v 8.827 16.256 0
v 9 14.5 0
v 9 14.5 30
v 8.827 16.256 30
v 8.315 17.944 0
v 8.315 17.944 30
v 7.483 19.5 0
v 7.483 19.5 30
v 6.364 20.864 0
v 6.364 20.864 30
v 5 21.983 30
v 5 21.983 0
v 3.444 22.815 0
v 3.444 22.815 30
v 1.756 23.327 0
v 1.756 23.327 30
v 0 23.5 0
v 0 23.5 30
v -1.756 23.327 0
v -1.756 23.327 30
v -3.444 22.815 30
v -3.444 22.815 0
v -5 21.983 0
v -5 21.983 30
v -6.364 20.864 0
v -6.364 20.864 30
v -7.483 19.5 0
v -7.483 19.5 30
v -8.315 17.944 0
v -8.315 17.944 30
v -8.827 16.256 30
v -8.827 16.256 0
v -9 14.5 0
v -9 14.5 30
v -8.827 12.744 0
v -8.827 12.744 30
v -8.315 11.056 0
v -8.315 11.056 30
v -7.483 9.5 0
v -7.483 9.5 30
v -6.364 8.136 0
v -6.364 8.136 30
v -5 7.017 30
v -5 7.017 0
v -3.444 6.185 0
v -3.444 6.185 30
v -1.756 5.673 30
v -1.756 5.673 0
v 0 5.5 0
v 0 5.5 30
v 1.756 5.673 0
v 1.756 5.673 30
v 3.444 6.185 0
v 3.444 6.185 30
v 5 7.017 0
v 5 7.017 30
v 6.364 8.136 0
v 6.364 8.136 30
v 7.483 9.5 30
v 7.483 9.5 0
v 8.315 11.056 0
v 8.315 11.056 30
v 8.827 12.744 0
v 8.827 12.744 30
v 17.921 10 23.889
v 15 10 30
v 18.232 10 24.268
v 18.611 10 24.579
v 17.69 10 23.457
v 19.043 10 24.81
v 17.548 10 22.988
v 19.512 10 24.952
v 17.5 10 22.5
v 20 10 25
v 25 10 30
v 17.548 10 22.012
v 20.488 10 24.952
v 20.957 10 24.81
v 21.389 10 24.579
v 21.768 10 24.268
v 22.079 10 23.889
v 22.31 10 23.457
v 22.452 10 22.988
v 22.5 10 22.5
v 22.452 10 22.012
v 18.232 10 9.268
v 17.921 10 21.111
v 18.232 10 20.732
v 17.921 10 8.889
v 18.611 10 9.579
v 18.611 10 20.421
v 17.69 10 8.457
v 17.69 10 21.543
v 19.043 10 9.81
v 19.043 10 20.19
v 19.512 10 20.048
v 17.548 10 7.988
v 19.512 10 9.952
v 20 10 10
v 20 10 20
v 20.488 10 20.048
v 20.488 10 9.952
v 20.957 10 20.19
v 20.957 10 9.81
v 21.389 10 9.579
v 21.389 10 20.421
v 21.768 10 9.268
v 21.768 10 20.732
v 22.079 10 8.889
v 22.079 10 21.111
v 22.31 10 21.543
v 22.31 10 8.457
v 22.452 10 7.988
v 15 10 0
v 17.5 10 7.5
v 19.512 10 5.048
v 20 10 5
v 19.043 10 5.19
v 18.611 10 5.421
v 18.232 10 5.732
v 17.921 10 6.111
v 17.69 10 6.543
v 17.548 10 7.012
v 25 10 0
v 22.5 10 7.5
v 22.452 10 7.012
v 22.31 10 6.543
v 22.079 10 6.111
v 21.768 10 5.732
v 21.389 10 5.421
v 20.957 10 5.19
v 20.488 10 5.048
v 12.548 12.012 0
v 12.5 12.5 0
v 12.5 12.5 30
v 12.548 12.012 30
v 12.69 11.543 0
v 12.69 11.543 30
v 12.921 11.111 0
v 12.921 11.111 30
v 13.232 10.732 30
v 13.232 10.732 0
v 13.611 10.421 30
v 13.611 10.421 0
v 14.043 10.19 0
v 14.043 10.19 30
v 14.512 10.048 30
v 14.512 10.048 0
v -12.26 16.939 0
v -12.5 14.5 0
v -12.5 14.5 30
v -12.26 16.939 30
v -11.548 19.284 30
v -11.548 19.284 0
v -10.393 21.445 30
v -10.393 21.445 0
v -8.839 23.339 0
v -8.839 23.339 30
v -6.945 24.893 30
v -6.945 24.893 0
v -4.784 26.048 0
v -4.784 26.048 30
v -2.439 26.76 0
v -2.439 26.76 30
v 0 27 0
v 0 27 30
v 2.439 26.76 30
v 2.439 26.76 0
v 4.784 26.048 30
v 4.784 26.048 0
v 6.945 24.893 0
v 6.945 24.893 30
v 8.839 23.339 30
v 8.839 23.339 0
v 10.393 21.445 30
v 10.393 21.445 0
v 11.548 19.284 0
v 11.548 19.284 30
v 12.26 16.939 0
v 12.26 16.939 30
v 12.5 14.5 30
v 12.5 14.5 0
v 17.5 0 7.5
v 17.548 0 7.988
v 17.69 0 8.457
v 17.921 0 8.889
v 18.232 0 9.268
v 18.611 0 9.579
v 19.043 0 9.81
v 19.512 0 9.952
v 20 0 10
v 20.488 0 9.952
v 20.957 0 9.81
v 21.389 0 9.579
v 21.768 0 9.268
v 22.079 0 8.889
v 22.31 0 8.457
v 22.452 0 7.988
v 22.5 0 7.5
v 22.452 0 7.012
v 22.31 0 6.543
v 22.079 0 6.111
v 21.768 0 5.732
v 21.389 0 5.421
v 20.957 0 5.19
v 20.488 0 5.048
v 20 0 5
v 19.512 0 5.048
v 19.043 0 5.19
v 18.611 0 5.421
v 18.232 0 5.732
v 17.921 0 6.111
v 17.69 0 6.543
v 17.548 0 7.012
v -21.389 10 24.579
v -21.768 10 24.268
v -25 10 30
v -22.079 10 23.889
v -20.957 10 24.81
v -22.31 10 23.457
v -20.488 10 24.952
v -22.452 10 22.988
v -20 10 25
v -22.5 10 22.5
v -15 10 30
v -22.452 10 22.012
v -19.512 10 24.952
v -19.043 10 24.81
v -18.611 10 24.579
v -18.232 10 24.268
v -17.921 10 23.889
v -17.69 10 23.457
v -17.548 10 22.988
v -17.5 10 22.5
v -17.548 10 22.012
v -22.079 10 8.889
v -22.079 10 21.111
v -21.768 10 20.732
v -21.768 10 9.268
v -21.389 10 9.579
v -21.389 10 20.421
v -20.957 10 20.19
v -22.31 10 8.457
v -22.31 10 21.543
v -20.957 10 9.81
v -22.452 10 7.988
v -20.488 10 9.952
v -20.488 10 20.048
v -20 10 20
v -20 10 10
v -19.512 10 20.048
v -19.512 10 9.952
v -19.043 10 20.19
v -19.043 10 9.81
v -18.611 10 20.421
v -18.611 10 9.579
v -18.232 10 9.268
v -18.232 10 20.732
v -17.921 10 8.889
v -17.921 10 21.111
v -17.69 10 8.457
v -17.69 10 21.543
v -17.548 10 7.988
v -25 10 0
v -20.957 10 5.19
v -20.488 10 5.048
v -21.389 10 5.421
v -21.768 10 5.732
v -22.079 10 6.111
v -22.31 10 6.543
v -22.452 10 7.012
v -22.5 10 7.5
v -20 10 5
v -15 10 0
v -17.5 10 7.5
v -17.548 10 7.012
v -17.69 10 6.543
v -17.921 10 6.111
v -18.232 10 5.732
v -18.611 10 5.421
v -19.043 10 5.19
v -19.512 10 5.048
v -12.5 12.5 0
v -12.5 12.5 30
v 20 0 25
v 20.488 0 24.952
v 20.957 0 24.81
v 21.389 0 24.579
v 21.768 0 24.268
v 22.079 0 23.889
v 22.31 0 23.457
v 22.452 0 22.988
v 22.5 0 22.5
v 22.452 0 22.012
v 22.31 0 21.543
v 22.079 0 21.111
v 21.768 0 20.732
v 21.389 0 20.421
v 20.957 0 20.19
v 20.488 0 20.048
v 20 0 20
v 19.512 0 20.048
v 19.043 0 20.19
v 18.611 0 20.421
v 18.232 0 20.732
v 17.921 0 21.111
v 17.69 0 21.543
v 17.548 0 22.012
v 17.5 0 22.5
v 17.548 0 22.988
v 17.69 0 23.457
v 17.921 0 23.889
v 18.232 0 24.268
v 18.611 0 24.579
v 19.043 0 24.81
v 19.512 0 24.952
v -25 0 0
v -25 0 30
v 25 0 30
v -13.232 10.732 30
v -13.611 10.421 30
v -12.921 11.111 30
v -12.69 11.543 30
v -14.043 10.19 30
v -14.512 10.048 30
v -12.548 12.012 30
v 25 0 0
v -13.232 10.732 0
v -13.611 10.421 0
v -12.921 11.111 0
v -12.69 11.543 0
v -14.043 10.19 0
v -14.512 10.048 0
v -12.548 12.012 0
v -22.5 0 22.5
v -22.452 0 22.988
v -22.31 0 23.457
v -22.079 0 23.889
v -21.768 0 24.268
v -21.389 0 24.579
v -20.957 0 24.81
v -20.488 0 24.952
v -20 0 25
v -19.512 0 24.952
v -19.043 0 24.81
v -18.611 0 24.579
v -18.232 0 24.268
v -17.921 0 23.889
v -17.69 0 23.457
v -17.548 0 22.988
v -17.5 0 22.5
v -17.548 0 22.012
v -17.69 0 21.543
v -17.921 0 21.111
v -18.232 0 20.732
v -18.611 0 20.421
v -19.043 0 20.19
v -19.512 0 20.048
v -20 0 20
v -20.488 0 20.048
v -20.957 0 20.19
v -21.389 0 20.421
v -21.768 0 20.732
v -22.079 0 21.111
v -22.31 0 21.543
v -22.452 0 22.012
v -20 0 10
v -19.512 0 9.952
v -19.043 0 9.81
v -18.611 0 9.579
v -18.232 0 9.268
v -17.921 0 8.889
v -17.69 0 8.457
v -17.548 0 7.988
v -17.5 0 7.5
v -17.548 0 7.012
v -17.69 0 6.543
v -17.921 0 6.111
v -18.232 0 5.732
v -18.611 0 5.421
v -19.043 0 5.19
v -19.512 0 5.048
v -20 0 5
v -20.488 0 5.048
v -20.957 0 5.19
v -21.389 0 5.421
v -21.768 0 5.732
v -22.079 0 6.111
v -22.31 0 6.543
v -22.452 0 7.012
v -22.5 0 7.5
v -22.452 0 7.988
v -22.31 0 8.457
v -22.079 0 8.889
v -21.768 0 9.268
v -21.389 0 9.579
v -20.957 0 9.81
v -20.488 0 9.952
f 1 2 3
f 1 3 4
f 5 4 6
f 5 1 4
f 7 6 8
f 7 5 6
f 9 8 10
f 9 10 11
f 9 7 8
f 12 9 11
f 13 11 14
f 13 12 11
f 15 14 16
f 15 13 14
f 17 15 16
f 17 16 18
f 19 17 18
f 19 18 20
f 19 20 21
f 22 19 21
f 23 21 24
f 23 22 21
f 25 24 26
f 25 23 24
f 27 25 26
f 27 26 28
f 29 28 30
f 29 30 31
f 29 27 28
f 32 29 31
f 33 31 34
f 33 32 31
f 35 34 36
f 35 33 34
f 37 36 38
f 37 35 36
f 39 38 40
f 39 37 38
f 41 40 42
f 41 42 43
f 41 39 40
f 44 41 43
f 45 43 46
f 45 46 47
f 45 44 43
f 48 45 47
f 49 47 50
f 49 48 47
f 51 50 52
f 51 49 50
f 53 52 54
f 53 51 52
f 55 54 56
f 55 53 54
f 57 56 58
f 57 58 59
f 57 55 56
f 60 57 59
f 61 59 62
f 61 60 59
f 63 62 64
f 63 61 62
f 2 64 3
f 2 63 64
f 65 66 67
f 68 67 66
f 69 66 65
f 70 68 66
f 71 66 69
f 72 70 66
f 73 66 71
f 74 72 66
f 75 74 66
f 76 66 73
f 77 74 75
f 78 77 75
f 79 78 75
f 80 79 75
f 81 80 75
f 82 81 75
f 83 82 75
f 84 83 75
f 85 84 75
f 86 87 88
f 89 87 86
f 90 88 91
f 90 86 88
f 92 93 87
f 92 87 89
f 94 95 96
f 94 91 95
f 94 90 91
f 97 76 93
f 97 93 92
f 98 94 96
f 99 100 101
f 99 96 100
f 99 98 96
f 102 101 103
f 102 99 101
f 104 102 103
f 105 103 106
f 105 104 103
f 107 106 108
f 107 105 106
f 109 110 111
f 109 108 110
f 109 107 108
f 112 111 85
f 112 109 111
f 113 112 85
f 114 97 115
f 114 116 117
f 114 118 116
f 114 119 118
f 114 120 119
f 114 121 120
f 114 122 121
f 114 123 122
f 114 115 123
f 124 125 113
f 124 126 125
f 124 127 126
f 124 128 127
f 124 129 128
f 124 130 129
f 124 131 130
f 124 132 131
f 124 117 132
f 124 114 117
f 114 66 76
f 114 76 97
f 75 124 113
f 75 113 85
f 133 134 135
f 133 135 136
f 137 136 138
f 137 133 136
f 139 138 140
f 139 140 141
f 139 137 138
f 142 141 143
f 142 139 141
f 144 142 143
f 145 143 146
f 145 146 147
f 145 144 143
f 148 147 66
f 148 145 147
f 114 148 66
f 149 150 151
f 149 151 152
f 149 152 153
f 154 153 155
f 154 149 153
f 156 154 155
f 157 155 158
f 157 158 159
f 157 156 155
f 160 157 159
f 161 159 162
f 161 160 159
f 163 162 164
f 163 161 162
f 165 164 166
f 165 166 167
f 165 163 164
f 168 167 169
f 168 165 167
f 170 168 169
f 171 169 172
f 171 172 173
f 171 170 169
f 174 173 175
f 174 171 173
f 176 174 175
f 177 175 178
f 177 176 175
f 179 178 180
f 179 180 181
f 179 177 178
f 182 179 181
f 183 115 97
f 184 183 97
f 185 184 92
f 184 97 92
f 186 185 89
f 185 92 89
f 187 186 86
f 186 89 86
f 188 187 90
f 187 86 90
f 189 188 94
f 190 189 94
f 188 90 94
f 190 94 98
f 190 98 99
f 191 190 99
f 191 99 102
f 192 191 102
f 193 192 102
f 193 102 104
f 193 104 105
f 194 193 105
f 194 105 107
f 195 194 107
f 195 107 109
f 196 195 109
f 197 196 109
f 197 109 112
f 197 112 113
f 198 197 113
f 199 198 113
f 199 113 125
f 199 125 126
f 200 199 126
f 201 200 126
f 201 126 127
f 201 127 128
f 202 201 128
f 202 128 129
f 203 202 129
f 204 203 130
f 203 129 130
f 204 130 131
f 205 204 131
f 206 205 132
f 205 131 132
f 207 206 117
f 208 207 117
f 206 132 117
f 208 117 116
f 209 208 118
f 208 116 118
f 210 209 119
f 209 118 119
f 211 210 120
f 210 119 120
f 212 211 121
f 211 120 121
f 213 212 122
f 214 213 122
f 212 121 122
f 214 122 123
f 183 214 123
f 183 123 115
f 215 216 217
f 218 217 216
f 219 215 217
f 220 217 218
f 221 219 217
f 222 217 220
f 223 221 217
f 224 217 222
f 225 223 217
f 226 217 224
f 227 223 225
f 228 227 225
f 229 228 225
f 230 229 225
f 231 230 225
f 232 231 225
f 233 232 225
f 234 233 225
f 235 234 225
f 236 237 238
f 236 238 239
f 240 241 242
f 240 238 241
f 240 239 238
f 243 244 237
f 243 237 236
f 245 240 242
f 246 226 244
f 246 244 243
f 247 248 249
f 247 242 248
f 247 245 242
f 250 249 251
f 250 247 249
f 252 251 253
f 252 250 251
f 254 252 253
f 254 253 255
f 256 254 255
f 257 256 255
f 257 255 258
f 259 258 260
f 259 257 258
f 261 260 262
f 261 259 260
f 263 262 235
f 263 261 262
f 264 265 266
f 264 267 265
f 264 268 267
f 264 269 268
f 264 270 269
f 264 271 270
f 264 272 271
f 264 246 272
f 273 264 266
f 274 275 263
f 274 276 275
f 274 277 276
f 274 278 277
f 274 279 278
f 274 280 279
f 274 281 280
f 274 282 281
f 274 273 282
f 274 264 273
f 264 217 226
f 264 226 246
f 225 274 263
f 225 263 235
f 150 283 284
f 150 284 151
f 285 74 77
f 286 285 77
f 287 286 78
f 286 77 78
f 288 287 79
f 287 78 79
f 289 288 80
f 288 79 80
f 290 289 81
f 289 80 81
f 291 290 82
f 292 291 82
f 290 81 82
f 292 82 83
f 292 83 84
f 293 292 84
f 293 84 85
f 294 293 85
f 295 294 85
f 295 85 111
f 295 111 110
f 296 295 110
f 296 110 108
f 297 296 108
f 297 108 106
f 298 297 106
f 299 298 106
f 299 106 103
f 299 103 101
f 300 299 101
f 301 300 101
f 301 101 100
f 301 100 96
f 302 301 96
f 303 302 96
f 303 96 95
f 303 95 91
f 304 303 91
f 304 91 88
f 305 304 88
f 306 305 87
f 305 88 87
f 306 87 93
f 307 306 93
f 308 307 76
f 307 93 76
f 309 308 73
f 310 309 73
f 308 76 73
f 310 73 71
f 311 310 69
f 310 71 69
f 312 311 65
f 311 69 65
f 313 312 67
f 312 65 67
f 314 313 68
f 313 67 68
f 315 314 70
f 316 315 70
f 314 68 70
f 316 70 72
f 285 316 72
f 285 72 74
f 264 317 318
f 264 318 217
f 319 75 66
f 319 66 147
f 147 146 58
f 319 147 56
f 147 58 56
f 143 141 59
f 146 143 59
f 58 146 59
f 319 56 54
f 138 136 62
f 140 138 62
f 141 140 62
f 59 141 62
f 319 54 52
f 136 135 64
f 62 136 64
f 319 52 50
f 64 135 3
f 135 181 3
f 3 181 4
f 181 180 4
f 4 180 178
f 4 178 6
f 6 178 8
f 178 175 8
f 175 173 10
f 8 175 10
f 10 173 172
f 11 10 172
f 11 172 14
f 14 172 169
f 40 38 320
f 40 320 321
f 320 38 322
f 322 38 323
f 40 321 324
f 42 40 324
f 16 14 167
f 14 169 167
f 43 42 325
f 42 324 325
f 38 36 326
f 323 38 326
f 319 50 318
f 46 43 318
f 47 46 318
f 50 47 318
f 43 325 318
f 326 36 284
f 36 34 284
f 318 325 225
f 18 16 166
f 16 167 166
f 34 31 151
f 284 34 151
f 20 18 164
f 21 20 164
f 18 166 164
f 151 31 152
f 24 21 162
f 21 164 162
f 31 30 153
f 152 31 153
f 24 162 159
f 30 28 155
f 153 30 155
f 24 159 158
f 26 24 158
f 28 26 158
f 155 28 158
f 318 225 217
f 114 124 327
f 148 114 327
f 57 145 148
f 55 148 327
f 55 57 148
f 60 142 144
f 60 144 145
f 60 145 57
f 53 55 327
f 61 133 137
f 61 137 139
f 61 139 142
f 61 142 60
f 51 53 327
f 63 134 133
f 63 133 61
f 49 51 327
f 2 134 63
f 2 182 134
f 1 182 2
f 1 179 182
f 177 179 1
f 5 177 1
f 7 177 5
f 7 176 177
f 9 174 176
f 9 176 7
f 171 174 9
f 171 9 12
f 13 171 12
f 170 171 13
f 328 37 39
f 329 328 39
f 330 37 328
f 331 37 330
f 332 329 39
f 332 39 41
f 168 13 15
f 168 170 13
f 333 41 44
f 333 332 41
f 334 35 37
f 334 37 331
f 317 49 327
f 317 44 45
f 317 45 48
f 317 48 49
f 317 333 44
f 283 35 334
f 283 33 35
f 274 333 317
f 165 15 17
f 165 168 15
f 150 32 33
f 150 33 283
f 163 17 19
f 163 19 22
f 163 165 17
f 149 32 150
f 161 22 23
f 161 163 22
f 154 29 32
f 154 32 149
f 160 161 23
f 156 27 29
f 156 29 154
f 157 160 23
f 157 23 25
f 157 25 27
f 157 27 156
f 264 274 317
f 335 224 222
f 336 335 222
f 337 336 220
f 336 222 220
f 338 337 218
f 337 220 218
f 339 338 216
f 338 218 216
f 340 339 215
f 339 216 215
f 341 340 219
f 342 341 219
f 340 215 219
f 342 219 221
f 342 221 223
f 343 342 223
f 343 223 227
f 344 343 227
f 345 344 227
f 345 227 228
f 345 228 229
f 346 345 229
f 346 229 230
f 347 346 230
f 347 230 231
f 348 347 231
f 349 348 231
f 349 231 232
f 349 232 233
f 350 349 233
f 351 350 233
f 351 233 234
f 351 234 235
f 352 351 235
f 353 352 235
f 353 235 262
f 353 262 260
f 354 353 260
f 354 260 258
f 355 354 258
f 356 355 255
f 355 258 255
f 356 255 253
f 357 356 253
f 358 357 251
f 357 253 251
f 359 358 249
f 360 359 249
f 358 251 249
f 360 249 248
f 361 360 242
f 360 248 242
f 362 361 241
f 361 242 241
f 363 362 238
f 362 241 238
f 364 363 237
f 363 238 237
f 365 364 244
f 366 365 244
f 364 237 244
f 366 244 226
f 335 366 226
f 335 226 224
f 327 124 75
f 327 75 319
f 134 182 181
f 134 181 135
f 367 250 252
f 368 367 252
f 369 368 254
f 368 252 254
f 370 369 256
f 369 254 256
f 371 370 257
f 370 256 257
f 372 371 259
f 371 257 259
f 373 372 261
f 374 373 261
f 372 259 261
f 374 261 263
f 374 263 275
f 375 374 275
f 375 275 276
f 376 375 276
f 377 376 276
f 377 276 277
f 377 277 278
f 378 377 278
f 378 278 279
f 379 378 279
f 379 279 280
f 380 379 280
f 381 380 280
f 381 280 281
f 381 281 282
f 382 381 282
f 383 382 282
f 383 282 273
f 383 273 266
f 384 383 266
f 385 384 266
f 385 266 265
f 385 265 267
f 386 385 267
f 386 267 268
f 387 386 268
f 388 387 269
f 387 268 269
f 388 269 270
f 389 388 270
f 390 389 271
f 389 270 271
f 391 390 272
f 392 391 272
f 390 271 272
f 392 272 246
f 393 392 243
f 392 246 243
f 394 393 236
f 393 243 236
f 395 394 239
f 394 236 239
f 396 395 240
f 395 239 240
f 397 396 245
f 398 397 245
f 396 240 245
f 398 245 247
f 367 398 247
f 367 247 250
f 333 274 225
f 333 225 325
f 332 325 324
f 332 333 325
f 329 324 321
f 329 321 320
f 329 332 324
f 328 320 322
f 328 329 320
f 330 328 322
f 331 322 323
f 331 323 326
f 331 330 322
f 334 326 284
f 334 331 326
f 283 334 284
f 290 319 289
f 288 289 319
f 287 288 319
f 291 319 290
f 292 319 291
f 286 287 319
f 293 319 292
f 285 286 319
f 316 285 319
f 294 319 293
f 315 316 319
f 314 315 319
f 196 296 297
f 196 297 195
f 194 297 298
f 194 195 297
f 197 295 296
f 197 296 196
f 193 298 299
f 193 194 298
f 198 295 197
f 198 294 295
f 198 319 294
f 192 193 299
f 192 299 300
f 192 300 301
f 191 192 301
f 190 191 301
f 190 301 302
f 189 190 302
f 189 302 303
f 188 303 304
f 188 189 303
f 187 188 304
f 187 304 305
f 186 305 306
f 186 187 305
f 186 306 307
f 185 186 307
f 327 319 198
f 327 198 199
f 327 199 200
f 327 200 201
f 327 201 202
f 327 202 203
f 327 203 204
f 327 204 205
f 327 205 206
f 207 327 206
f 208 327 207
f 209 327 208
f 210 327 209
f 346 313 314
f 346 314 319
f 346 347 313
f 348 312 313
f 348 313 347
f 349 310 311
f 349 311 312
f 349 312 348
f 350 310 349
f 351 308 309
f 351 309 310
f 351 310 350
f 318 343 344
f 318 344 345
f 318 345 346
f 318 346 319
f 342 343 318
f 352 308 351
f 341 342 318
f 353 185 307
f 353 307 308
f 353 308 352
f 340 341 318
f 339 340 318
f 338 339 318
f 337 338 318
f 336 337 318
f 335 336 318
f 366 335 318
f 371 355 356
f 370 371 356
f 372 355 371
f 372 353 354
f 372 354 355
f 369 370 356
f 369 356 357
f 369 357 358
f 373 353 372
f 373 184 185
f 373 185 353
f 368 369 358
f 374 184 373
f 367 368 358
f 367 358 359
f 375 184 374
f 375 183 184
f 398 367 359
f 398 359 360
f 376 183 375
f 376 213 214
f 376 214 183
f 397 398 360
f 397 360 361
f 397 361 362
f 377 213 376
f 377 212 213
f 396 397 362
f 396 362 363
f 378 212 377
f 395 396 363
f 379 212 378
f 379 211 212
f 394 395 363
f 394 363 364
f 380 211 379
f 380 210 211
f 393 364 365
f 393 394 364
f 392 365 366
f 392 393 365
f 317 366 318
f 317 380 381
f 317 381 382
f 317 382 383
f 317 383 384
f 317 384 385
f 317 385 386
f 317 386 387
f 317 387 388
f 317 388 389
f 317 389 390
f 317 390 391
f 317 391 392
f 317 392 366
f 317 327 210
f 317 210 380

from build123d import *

# Parameters (mm, degrees)
SKETCH1_R           = 9
BOSS_EXTRUDE1_DEPTH = 30
SKETCH3_R           = 2.5
CUT_EXTRUDE1_DEPTH  = 17.65


with BuildPart() as part:
    # Sketch1 → Boss-Extrude1 (new body)
    with BuildSketch(Plane.XY):
        with BuildLine():
            Line((0, 0), (-25, 0))
            Line((-25, 0), (-25, 10))
            Line((-25, 10), (-15, 10))
            ThreePointArc((-15, 10), (-13.232233047, 10.732233047), (-12.5, 12.5))
            Line((-12.5, 12.5), (-12.5, 14.5))
            ThreePointArc((-12.5, 14.5), (0, 27), (12.5, 14.5))
            Line((12.5, 14.5), (12.5, 12.5))
            ThreePointArc((12.5, 12.5), (13.232233047, 10.732233047), (15, 10))
            Line((15, 10), (25, 10))
            Line((25, 10), (25, 0))
            Line((25, 0), (0, 0))
        make_face()
        with Locations((0, 14.5)):
            Circle(SKETCH1_R, mode=Mode.SUBTRACT)
    extrude(amount=BOSS_EXTRUDE1_DEPTH)

    # Sketch3 → Cut-Extrude1 (cut)
    with BuildSketch(Plane(origin=(0, 10, 0), x_dir=(1, 0, 0), z_dir=(0, 1, 0))):
        with Locations(Location((-20, -7.5, 0), (0, 0, 270))):
            Circle(SKETCH3_R)
        with Locations(Location((-20, -22.5, 0), (0, 0, 180))):
            Circle(SKETCH3_R)
        with Locations(Location((20, -22.5, 0), (0, 0, 270))):
            Circle(SKETCH3_R)
        with Locations(Location((20, -7.5, 0), (0, 0, 180))):
            Circle(SKETCH3_R)
    extrude(amount=-CUT_EXTRUDE1_DEPTH, mode=Mode.SUBTRACT)


solid = part.part
